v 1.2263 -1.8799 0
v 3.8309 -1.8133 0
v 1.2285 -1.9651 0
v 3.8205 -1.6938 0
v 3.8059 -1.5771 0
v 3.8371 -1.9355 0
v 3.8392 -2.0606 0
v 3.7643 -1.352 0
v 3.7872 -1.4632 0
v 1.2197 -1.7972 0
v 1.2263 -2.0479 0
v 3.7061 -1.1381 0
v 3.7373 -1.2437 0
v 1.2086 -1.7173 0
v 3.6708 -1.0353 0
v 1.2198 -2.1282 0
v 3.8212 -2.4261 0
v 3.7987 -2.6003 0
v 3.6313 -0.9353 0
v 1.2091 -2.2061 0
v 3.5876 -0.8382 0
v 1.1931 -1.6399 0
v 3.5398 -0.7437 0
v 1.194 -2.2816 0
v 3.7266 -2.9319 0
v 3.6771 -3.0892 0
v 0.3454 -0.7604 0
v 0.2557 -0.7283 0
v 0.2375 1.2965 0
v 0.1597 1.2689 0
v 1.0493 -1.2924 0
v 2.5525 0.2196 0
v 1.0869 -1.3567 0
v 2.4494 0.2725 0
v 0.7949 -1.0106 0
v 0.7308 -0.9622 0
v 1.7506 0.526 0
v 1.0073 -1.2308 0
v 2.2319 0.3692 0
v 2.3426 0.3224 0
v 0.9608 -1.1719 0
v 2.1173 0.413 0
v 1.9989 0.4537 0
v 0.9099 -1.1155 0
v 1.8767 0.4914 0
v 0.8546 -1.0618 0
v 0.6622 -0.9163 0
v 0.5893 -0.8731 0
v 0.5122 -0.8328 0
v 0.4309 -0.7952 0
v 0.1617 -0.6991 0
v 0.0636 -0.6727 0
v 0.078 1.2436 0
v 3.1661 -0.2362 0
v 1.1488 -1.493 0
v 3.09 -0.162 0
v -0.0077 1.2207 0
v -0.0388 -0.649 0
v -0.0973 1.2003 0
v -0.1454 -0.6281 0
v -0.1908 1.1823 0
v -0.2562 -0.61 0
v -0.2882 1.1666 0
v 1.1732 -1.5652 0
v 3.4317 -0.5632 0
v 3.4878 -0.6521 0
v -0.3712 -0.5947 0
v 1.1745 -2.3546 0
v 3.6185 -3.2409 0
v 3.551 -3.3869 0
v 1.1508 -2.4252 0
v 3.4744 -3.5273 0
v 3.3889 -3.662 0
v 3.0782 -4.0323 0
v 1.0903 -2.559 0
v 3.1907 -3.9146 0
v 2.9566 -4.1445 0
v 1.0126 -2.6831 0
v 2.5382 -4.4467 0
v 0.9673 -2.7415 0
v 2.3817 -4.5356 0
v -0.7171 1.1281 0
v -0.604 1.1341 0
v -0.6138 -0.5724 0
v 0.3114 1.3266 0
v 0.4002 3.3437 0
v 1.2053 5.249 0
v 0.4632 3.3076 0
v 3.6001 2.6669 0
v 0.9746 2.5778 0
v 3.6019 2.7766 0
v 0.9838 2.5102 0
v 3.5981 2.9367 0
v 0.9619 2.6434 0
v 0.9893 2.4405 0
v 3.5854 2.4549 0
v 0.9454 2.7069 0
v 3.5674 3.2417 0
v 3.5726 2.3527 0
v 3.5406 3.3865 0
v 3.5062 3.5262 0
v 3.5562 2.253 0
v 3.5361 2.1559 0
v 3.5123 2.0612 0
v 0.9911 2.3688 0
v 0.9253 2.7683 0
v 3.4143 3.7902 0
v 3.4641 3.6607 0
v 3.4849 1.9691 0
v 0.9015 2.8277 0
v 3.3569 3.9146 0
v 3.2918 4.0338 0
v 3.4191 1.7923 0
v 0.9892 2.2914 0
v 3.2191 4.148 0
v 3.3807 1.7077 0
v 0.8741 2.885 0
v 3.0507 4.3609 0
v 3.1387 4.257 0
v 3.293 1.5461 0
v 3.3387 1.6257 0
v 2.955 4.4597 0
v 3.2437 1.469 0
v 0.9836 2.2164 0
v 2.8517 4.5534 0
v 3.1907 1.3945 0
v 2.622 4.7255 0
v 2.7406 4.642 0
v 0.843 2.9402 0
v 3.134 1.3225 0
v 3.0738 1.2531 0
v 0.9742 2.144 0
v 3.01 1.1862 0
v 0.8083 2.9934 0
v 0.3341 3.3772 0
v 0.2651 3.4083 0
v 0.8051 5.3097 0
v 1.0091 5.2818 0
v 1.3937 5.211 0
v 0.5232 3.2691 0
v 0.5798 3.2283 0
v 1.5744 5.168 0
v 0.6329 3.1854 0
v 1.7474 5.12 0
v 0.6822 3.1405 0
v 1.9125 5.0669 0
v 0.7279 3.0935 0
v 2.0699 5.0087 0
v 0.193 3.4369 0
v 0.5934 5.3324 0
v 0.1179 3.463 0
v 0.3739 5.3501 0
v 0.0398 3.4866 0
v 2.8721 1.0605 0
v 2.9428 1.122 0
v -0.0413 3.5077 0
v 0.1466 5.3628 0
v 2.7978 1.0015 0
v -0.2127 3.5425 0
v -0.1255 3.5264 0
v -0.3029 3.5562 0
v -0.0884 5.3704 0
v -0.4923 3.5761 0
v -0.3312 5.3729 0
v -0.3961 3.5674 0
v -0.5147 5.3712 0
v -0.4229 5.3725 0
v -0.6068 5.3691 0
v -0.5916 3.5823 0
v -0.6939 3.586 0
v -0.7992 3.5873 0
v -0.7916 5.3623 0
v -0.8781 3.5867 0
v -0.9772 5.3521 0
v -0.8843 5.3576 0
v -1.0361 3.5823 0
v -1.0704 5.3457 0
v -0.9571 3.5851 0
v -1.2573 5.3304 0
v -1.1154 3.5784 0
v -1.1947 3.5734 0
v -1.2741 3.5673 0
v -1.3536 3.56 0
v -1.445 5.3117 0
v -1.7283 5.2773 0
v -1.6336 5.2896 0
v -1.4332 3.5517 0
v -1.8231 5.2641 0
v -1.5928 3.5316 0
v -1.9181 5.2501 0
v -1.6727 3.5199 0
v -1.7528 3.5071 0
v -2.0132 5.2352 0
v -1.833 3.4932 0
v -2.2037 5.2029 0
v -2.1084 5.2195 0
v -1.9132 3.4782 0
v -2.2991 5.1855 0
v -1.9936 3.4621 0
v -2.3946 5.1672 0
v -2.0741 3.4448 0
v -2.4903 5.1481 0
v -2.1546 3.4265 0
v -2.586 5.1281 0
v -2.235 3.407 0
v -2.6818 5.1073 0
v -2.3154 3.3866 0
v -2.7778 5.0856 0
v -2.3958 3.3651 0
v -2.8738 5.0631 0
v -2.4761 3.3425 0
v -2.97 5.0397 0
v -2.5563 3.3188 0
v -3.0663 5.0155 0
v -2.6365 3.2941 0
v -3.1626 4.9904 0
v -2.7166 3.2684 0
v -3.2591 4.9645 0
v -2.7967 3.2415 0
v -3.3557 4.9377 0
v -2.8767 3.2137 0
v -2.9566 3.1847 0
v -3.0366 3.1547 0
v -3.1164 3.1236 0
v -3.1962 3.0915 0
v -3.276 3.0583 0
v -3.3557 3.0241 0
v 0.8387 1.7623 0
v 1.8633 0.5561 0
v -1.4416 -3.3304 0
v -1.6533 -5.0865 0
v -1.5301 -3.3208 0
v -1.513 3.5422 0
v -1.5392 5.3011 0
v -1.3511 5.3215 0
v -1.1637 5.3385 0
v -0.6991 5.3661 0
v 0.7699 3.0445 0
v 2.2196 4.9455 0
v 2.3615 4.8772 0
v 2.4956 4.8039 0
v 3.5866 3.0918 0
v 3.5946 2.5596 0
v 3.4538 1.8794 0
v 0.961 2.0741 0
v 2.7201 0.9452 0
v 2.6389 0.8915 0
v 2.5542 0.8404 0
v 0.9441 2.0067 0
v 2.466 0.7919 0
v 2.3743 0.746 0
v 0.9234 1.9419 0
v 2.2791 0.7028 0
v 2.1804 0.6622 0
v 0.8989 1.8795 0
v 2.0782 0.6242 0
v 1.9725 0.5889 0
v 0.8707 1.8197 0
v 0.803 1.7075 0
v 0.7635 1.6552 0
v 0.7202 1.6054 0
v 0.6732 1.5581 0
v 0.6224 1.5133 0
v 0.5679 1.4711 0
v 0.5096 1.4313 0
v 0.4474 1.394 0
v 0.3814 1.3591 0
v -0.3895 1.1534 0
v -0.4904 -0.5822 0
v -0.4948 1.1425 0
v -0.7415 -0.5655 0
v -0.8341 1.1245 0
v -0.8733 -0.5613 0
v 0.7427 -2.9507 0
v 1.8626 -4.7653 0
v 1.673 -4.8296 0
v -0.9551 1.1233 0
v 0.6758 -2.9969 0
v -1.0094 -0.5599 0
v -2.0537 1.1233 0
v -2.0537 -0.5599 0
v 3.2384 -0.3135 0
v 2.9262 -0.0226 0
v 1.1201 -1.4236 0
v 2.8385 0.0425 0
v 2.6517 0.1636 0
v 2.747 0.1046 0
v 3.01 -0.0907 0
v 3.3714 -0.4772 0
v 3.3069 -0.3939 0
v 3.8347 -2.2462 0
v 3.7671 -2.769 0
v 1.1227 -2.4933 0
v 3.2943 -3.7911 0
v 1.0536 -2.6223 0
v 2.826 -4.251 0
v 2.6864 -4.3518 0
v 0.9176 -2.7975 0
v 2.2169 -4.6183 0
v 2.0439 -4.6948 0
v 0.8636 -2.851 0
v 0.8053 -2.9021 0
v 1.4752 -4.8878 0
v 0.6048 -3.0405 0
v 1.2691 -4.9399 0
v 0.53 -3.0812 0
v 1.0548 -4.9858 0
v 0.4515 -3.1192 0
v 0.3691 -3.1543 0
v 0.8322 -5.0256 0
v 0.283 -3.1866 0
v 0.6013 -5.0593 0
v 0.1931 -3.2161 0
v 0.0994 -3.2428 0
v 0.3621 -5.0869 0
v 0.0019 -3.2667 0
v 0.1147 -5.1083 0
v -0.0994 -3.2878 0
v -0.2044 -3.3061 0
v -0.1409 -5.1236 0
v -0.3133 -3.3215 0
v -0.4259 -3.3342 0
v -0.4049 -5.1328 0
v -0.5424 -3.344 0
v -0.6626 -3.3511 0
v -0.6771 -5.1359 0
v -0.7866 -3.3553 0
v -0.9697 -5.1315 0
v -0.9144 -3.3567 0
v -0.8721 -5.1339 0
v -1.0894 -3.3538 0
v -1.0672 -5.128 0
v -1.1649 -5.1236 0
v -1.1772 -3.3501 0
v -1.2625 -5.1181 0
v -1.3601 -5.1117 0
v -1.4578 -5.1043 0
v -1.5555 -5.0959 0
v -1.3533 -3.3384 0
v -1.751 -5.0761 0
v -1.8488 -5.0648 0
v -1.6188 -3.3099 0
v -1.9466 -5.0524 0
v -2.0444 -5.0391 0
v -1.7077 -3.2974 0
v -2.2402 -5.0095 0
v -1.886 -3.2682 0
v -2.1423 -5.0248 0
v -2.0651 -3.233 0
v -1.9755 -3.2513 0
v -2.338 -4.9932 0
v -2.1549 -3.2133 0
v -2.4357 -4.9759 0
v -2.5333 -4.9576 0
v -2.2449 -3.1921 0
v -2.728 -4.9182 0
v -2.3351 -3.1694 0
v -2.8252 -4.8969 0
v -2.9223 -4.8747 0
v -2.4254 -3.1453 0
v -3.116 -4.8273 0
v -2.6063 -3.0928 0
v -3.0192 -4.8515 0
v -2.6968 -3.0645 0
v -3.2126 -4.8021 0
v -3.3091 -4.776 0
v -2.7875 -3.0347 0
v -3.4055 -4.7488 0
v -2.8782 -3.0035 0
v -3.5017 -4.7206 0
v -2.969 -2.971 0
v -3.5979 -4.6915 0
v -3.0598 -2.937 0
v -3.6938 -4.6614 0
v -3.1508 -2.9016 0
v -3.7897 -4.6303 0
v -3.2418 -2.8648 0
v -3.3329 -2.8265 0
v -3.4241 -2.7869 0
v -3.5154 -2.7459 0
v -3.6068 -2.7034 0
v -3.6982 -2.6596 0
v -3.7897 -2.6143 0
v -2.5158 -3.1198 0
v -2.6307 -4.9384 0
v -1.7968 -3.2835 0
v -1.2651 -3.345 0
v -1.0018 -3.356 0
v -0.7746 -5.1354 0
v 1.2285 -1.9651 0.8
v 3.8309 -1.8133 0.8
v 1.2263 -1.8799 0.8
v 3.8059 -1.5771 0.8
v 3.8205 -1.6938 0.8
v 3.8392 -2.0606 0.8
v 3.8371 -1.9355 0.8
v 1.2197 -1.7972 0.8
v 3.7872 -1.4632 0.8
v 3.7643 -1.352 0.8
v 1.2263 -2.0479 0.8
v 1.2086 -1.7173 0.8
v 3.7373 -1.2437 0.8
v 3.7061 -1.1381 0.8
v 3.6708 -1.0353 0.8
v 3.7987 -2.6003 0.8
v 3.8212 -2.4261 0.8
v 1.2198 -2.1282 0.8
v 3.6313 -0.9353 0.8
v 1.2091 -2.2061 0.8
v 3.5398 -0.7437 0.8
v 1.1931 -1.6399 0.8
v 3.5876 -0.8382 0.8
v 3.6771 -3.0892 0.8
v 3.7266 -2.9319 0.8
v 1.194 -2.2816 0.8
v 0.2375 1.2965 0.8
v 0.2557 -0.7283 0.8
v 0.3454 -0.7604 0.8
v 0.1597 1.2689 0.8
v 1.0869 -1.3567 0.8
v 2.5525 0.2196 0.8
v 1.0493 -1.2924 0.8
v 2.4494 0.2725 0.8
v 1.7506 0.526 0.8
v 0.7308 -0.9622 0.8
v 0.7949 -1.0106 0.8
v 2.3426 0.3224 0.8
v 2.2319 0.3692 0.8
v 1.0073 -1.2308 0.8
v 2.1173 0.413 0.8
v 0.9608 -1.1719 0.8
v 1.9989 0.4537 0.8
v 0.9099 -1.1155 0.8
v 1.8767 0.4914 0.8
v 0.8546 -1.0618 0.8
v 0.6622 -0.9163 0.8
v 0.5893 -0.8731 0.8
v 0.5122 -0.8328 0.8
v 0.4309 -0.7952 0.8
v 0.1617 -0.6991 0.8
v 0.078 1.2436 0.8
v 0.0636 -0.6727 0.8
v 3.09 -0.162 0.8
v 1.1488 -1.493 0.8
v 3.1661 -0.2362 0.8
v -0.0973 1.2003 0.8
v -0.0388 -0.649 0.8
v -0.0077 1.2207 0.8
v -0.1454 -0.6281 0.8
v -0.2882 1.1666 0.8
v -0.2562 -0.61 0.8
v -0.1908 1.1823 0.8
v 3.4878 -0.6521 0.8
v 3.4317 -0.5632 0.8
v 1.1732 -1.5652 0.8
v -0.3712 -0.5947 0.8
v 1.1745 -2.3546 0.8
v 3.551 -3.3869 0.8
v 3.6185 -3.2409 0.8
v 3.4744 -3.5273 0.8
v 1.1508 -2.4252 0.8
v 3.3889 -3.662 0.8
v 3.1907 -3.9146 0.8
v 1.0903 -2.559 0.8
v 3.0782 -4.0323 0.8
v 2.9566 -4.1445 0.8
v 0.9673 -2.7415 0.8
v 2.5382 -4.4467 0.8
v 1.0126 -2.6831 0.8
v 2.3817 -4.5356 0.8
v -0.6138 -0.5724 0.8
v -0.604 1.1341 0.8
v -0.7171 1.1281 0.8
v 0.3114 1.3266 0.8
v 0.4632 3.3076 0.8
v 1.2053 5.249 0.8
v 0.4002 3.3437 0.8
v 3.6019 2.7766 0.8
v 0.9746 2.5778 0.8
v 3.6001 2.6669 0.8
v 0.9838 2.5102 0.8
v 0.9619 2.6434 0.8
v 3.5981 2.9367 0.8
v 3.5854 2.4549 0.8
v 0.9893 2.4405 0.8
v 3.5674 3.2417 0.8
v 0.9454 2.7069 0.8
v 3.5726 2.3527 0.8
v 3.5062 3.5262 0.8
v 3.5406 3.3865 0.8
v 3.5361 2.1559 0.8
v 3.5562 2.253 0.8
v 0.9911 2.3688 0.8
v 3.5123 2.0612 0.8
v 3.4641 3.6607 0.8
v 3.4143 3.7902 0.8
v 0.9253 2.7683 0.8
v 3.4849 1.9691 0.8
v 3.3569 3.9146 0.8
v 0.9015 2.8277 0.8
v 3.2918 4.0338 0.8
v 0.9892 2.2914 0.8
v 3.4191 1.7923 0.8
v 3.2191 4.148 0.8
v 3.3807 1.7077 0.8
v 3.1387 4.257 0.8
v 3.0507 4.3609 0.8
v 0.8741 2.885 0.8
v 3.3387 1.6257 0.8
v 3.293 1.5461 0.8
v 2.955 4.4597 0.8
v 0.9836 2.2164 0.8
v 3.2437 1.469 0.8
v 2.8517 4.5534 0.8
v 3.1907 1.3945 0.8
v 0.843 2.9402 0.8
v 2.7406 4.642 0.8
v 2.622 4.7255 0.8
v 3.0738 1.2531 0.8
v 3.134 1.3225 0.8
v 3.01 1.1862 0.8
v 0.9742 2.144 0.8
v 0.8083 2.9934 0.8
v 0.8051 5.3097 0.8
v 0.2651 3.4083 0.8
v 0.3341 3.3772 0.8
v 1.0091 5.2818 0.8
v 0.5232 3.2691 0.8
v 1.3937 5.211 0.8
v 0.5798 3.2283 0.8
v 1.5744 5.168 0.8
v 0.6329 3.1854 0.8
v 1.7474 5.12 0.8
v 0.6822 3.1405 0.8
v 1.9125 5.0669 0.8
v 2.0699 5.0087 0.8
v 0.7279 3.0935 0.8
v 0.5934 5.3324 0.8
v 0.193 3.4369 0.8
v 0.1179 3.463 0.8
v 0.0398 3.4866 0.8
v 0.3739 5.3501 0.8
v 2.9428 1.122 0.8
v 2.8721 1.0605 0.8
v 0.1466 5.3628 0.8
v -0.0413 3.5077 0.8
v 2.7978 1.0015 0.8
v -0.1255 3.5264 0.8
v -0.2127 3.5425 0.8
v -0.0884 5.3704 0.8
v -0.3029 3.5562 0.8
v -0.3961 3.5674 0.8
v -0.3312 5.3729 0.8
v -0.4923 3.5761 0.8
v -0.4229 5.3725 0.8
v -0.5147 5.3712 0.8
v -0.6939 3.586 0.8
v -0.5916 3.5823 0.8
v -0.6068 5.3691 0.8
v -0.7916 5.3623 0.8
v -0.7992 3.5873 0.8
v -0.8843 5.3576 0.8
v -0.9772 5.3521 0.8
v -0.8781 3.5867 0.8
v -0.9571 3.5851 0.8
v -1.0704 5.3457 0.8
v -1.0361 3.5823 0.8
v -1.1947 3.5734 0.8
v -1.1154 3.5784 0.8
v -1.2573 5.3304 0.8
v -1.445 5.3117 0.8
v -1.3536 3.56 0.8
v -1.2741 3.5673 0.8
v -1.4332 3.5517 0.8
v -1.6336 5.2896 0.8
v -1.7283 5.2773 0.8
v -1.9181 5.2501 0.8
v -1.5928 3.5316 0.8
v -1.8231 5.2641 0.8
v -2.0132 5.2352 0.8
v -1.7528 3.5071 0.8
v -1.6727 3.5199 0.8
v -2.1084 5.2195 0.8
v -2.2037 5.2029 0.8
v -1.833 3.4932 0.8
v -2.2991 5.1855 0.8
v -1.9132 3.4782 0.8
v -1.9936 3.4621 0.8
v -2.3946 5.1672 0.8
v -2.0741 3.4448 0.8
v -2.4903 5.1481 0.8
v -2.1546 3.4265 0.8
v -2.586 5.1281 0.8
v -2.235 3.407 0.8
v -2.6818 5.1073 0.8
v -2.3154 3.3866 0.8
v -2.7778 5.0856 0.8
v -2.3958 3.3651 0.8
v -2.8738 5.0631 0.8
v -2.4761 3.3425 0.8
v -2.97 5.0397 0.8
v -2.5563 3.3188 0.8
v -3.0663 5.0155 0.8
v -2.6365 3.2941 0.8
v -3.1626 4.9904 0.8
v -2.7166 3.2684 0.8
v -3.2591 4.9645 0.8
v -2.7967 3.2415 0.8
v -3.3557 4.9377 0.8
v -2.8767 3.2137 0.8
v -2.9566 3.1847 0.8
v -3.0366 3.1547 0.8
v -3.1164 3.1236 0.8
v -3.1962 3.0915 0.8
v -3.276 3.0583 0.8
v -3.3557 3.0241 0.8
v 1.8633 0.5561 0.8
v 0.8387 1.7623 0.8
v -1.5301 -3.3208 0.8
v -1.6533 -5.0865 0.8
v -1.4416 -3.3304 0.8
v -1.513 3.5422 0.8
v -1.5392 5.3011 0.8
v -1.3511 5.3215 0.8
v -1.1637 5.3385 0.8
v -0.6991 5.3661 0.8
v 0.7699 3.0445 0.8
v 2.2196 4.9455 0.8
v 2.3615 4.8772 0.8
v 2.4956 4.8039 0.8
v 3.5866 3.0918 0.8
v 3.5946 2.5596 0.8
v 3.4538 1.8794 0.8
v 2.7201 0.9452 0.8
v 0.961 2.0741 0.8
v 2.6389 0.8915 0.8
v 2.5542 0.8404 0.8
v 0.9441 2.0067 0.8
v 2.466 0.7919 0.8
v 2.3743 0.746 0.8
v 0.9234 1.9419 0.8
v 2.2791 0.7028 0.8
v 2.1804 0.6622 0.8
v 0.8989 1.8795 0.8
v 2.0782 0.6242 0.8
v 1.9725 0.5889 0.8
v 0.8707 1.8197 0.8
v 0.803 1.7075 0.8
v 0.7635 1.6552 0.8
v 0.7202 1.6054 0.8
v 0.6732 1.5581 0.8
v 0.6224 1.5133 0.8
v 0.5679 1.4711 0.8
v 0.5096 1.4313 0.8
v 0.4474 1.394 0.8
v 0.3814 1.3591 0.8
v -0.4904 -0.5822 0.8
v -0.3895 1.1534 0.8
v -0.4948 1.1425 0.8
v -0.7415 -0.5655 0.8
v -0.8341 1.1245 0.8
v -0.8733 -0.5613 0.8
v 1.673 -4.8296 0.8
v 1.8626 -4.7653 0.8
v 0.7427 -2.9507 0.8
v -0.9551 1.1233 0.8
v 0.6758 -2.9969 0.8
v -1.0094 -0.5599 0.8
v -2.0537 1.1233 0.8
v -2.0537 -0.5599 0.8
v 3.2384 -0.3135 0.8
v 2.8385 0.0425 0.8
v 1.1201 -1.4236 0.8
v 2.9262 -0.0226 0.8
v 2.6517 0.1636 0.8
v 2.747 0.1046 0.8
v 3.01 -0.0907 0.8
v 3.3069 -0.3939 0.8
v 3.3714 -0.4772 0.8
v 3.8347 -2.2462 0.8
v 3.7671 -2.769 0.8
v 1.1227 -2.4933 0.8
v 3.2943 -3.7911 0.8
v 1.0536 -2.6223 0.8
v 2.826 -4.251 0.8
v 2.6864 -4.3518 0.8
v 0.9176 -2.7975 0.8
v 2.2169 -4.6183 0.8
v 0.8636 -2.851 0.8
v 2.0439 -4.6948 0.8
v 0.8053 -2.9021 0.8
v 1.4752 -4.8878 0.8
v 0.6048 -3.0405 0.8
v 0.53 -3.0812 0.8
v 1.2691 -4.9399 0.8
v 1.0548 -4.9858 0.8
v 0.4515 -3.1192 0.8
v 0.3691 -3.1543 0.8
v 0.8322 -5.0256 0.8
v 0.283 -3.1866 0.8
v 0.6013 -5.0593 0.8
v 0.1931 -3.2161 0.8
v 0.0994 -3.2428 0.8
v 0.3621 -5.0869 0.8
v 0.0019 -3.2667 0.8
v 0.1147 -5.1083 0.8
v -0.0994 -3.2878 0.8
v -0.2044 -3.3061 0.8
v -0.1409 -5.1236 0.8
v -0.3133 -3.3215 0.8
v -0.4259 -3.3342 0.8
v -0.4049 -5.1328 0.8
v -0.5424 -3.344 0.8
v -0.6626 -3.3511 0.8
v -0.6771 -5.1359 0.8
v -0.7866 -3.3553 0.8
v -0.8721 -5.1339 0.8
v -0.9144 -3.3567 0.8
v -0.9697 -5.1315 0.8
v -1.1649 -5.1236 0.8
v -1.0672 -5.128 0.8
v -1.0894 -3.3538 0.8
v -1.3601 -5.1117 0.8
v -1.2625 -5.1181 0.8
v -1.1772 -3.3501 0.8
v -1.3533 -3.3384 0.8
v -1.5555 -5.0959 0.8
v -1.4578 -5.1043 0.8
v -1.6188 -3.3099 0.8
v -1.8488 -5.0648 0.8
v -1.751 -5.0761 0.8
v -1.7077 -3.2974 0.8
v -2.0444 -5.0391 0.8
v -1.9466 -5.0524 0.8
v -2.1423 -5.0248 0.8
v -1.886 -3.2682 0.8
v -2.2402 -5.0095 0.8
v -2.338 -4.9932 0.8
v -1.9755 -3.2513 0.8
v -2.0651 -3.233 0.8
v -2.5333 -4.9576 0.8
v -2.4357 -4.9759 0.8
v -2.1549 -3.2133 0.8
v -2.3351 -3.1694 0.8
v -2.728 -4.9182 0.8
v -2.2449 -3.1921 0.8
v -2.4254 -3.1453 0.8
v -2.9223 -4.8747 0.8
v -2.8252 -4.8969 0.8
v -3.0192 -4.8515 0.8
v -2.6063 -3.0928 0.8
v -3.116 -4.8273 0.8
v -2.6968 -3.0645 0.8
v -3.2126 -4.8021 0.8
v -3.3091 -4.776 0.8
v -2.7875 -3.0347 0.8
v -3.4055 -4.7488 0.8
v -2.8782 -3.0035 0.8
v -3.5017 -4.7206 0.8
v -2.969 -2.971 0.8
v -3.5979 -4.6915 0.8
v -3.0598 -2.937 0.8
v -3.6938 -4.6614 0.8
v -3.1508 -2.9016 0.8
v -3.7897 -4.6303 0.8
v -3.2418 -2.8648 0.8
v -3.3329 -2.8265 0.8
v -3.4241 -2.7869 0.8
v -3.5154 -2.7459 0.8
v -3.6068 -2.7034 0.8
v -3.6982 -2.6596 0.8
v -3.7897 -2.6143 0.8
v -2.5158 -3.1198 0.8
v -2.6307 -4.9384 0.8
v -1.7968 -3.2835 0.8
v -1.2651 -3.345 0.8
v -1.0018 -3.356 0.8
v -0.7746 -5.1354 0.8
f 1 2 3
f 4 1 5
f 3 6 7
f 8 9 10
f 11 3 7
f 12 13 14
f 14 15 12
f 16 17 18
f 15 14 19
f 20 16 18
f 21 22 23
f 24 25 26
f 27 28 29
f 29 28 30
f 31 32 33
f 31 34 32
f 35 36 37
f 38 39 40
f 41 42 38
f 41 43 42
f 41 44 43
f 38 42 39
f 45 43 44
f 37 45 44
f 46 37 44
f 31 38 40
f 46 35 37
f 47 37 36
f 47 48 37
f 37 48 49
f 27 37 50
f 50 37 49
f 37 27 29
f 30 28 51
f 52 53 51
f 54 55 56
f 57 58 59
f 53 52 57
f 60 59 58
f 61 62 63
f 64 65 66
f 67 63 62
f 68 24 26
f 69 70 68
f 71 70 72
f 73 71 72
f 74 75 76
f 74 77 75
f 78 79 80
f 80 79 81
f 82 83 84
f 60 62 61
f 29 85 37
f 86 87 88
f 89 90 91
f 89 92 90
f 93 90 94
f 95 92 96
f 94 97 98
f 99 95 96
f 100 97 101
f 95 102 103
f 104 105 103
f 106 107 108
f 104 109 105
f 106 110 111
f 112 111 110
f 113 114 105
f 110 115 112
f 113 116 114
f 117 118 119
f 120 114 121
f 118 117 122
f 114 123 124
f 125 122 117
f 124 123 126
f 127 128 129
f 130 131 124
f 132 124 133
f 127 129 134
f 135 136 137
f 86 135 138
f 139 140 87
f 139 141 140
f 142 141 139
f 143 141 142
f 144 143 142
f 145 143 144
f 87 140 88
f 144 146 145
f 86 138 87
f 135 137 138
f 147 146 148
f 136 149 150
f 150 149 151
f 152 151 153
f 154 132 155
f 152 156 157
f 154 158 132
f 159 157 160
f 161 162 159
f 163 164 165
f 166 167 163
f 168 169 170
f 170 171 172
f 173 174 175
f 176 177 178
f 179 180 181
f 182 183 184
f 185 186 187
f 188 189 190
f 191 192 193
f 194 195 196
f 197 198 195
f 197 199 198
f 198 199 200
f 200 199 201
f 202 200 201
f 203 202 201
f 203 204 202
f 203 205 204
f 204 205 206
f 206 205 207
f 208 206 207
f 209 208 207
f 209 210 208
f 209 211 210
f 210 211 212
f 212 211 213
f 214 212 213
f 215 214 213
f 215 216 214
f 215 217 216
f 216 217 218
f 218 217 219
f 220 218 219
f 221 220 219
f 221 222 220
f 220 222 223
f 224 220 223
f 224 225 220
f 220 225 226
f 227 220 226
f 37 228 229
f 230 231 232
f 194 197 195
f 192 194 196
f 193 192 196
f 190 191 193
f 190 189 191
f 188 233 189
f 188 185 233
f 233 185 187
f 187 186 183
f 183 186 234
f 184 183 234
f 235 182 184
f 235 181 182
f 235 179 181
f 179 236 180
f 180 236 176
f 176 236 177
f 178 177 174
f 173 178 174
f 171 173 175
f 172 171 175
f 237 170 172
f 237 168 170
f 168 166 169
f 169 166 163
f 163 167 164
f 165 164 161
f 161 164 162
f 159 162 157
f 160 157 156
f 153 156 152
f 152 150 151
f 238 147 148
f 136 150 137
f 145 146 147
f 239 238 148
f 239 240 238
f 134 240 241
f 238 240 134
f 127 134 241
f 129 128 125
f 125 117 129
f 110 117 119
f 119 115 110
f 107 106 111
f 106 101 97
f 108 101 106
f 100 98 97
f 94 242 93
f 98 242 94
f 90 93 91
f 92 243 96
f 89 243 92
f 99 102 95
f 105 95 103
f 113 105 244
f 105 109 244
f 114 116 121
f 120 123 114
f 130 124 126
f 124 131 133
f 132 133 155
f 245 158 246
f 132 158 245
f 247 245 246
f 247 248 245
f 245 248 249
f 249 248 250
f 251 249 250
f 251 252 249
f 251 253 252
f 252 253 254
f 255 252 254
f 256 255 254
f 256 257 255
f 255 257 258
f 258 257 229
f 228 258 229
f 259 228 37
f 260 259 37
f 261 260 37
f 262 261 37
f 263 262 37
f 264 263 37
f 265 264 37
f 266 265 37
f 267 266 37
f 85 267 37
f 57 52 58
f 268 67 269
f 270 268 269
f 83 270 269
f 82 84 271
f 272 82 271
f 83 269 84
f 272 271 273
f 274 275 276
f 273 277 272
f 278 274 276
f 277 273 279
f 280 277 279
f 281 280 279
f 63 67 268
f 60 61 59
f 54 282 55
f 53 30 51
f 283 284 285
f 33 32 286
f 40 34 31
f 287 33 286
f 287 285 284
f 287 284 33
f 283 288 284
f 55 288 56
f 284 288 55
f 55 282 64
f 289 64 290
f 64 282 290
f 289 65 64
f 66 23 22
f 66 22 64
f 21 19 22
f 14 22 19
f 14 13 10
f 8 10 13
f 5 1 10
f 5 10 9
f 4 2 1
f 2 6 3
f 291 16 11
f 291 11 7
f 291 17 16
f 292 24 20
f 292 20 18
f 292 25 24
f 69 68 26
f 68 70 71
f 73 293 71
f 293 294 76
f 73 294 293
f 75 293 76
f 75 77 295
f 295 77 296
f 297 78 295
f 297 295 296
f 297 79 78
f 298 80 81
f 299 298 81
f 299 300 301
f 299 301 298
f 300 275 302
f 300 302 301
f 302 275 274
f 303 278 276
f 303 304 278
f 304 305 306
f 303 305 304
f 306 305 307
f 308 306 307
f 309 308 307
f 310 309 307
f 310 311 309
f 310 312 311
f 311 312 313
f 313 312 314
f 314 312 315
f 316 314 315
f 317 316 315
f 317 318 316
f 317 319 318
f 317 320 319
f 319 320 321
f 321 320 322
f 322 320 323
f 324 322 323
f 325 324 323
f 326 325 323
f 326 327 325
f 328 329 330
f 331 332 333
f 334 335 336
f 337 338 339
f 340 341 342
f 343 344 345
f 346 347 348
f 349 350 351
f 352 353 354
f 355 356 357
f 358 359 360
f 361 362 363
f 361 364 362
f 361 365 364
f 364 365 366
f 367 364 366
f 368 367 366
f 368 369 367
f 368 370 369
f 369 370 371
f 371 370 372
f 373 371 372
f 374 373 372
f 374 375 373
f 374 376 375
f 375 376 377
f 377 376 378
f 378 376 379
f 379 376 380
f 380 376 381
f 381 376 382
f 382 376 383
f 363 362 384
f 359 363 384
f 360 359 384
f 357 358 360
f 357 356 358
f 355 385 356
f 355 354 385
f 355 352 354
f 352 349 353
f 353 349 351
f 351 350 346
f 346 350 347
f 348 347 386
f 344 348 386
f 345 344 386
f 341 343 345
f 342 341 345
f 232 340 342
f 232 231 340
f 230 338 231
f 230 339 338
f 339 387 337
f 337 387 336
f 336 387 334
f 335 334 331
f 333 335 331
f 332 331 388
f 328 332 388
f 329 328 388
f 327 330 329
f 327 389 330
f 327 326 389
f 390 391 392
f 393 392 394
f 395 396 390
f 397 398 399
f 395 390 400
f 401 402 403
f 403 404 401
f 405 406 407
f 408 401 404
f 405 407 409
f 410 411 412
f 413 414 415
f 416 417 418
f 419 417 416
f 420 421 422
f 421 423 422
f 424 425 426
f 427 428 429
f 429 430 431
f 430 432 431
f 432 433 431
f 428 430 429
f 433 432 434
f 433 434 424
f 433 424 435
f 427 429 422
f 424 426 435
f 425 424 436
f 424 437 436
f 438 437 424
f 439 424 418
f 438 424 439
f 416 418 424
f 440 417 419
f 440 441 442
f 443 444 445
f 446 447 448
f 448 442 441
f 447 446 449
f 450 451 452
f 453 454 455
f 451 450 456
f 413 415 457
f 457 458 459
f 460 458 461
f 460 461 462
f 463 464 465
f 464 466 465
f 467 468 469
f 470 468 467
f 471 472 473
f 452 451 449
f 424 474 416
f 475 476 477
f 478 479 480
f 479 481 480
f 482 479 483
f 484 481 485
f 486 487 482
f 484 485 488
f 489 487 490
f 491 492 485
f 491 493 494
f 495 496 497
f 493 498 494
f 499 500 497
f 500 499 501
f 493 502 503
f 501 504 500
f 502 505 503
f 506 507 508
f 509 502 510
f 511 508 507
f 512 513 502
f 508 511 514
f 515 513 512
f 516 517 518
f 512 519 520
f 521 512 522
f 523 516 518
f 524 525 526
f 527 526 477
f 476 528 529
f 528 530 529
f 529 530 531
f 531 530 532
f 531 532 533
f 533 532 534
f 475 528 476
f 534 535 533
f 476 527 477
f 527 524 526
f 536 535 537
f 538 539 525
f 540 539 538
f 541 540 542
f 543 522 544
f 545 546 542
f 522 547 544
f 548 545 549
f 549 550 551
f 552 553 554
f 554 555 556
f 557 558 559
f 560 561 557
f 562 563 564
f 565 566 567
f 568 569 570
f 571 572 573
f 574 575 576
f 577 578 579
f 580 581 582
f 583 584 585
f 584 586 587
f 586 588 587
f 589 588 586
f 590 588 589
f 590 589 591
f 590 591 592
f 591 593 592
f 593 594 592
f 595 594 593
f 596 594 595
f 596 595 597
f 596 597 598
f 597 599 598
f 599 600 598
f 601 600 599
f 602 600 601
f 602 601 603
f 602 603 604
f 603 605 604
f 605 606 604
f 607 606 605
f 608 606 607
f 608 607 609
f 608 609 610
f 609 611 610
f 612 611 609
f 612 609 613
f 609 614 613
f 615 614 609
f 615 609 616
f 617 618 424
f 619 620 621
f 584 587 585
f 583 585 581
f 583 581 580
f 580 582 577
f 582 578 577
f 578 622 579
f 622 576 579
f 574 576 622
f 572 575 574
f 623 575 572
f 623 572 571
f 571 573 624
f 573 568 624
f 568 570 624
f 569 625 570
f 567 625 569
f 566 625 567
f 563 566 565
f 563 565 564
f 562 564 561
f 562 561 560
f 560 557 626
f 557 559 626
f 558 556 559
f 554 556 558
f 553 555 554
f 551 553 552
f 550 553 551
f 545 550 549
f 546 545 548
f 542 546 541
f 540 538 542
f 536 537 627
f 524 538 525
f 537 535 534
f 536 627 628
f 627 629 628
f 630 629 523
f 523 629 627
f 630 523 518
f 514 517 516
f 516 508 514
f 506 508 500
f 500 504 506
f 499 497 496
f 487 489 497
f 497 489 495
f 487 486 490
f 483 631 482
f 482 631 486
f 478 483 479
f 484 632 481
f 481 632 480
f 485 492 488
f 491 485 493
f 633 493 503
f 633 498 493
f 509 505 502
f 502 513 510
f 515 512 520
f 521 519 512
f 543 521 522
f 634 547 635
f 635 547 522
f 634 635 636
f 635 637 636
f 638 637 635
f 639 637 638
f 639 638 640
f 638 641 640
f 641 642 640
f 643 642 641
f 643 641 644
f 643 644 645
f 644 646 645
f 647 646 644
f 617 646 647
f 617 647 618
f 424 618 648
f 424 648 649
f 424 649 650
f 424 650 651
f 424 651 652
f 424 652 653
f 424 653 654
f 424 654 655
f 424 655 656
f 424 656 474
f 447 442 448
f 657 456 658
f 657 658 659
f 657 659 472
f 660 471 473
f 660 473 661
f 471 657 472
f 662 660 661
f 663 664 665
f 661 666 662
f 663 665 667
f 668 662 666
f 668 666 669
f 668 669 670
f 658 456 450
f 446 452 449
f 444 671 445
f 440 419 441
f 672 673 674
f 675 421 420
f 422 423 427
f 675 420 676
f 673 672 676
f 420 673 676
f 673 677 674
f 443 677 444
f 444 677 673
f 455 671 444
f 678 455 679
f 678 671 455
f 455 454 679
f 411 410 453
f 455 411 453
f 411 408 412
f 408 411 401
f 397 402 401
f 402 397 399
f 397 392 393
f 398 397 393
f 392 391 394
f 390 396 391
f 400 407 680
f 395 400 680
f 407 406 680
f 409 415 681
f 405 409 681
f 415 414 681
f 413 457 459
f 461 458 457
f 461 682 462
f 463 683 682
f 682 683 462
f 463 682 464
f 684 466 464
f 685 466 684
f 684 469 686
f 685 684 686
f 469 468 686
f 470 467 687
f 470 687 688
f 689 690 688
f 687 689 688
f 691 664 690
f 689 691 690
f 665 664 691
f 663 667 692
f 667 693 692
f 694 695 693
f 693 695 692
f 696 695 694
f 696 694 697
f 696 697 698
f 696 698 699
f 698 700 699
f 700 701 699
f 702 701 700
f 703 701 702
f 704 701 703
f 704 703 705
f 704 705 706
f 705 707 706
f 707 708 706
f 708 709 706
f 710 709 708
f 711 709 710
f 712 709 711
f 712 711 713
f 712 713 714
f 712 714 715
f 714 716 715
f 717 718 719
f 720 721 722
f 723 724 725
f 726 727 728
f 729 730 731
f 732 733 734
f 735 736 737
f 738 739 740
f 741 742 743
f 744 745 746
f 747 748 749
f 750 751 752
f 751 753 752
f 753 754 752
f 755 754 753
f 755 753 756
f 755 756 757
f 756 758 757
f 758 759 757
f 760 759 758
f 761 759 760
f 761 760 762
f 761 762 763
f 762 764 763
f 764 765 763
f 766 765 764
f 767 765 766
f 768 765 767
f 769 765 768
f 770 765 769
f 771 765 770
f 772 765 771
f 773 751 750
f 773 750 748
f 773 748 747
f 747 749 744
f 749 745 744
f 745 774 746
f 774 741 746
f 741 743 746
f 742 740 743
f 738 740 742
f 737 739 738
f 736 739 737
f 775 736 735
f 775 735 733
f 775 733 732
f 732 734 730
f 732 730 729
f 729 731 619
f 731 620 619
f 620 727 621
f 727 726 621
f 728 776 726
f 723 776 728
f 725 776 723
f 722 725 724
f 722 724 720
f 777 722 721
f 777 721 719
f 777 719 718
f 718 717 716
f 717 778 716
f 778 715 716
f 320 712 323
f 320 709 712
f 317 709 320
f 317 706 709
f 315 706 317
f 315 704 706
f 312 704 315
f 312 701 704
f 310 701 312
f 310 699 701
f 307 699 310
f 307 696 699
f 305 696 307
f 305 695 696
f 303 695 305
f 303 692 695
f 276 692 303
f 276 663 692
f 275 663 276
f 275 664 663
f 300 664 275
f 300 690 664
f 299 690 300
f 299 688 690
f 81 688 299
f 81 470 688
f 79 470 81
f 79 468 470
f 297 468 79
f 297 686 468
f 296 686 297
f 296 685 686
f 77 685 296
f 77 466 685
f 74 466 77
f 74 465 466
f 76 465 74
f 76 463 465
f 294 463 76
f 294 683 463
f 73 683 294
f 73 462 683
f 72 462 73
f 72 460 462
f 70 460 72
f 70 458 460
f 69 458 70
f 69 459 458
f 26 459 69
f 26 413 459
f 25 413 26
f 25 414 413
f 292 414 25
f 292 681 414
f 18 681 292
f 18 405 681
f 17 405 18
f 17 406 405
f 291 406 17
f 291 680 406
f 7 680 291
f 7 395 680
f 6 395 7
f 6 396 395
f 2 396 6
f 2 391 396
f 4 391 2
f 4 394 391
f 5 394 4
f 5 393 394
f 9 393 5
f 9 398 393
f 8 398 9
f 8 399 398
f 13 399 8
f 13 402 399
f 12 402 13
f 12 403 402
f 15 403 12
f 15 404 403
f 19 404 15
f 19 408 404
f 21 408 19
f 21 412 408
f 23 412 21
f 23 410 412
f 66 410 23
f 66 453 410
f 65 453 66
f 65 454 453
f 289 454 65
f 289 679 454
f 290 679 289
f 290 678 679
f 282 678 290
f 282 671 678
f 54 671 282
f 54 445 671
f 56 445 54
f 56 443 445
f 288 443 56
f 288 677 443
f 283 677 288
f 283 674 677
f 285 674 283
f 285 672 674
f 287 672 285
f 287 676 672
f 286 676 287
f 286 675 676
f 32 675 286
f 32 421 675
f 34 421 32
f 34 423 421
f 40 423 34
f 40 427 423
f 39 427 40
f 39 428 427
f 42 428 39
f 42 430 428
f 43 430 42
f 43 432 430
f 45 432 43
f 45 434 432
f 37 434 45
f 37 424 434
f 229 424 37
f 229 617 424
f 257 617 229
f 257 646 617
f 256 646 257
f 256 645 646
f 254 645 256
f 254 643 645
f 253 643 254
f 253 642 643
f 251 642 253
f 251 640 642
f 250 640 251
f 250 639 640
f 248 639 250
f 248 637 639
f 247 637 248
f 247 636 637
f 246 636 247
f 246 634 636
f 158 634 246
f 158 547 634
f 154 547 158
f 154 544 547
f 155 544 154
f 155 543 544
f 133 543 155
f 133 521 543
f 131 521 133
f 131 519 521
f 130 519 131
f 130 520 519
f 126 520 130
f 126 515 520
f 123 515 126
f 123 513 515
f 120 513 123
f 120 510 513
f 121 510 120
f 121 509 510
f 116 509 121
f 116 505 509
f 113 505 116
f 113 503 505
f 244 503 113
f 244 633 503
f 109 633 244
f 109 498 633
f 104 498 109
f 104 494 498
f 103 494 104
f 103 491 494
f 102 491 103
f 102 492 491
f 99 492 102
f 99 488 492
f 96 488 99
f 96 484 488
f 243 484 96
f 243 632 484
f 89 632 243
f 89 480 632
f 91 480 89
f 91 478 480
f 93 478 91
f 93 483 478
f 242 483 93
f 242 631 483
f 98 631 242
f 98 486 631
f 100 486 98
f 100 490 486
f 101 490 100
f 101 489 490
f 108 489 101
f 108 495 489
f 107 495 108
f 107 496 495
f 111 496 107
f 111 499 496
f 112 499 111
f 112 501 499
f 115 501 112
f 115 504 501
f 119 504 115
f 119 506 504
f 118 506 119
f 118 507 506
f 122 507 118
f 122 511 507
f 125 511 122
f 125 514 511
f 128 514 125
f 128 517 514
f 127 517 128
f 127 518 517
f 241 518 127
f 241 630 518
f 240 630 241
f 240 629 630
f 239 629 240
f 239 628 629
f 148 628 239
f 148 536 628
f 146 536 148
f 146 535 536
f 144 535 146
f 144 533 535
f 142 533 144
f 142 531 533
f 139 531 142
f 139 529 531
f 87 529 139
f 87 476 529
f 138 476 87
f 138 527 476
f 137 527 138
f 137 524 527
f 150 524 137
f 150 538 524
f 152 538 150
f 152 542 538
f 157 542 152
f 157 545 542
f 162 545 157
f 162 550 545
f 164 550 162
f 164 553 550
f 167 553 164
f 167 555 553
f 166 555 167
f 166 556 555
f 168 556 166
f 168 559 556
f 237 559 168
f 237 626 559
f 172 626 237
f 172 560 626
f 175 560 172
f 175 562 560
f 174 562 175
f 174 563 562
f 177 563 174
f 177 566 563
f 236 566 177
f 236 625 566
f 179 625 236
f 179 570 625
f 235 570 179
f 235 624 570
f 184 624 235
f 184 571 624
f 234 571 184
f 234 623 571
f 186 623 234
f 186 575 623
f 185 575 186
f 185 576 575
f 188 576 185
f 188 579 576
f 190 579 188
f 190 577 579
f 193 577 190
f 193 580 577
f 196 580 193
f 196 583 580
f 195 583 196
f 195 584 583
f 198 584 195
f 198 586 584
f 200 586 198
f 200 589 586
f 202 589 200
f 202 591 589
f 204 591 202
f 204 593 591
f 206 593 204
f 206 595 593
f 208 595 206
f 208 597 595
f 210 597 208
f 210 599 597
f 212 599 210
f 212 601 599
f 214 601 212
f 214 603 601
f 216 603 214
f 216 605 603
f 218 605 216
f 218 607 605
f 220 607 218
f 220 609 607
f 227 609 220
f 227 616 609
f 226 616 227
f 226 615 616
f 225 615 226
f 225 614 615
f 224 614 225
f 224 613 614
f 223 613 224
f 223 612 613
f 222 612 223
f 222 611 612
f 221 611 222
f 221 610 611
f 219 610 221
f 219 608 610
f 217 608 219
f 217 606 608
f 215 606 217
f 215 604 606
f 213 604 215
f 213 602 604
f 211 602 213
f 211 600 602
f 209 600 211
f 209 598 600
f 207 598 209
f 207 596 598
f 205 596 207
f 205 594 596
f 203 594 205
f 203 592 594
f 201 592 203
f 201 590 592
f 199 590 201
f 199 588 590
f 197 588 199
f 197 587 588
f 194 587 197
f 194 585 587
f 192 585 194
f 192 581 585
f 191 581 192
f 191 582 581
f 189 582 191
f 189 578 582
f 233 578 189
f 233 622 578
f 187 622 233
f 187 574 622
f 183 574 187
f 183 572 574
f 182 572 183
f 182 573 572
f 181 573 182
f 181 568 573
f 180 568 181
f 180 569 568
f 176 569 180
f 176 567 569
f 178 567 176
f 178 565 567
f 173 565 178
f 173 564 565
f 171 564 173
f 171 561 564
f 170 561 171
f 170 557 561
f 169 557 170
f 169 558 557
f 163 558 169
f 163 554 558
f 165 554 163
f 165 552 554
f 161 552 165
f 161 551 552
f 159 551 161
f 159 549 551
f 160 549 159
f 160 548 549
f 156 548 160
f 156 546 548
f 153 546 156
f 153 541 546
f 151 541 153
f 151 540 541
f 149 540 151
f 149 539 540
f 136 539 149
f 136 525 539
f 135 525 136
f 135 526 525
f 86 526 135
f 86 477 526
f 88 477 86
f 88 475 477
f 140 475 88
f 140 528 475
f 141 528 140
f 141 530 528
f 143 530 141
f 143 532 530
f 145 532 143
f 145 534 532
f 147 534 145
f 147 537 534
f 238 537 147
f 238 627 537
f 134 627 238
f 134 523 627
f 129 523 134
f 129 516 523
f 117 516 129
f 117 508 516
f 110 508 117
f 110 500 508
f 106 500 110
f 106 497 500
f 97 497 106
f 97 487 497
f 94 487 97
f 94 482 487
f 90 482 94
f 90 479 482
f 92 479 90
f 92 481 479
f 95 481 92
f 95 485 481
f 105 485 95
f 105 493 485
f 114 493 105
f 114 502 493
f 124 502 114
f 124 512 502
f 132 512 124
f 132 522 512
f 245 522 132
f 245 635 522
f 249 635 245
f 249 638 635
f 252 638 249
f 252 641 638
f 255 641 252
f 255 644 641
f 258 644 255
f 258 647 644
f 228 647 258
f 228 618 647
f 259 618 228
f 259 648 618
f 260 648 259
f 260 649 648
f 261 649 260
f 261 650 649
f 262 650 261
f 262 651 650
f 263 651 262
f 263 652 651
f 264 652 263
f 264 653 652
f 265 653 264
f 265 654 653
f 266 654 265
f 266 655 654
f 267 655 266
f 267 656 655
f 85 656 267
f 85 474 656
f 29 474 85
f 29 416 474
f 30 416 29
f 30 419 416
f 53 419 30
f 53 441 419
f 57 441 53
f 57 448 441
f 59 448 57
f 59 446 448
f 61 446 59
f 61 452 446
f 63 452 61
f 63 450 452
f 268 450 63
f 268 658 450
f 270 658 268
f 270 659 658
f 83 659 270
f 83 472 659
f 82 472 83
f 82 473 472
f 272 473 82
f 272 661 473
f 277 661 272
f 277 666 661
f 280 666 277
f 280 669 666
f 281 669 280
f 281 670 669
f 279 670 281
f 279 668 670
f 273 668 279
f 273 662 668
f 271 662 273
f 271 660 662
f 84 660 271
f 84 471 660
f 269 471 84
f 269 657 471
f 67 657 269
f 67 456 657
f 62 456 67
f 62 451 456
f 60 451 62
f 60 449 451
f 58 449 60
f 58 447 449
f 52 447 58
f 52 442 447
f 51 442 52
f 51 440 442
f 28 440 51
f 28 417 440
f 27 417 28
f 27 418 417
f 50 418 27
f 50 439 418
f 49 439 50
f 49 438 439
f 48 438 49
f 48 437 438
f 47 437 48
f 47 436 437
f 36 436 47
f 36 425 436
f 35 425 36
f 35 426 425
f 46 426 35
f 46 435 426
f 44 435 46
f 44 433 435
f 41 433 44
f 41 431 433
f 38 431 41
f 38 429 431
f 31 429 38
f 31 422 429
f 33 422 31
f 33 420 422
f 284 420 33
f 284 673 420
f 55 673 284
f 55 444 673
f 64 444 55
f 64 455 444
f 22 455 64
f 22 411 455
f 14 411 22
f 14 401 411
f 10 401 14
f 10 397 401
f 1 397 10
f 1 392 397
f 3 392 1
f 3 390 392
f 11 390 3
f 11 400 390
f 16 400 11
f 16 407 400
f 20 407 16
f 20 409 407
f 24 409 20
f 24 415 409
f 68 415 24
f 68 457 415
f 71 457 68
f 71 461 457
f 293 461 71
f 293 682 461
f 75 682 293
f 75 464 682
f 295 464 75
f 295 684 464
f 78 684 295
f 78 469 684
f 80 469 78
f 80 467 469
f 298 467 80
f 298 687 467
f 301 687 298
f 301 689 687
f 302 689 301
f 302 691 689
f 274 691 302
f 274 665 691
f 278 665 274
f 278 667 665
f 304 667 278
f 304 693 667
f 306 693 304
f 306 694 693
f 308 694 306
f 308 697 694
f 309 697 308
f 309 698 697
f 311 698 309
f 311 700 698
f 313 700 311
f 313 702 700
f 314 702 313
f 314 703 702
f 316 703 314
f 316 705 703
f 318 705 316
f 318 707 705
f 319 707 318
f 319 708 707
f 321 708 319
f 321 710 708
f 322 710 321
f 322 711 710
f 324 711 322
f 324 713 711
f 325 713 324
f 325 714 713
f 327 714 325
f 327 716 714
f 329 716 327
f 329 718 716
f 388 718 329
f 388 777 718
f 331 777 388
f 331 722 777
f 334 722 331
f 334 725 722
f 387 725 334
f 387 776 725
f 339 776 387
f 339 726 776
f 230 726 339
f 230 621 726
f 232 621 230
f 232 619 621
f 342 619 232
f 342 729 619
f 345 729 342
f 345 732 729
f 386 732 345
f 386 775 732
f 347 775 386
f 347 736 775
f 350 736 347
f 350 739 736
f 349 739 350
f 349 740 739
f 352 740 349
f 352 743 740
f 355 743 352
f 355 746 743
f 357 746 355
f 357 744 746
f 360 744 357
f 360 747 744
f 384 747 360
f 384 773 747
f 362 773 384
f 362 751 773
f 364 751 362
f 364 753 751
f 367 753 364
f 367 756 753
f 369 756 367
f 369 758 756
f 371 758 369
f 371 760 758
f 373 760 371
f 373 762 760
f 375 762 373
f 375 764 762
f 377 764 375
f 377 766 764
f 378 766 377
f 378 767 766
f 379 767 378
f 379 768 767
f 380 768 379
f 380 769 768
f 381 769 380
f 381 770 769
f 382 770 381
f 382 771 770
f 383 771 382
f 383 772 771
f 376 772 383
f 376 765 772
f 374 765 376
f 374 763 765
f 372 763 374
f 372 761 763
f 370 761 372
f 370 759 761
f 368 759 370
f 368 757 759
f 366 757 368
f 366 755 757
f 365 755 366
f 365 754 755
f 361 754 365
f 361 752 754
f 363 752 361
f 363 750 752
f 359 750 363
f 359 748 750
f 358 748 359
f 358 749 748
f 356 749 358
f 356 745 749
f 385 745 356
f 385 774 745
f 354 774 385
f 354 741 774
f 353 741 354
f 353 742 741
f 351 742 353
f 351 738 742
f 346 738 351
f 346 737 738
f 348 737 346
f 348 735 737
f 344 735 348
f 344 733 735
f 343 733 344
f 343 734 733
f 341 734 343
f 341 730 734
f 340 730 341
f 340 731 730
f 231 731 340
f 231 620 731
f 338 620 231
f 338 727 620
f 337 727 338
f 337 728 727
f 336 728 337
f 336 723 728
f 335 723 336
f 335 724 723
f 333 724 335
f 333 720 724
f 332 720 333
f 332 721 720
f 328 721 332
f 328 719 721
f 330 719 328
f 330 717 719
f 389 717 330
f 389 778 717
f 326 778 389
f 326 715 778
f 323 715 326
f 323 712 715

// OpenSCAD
//------------------------------------------------------
// Mark
// Simple texte
// 5@xes 04/03/2022
//------------------------------------------------------

$fn=120;
// font = "Roboto:style=Bold";
// font = "Leelawadee:style=Bold";
font = "Gill Sans MT:style=Bold";

letter_height = 0.8;
letter_size =10;

translate([0,0,0]) letter("3");


module letter(Txt) {
  color("Red")
  linear_extrude(height = letter_height) {
    text(Txt, size = letter_size, font = font, halign = "center", valign = "center");
  }
}                
